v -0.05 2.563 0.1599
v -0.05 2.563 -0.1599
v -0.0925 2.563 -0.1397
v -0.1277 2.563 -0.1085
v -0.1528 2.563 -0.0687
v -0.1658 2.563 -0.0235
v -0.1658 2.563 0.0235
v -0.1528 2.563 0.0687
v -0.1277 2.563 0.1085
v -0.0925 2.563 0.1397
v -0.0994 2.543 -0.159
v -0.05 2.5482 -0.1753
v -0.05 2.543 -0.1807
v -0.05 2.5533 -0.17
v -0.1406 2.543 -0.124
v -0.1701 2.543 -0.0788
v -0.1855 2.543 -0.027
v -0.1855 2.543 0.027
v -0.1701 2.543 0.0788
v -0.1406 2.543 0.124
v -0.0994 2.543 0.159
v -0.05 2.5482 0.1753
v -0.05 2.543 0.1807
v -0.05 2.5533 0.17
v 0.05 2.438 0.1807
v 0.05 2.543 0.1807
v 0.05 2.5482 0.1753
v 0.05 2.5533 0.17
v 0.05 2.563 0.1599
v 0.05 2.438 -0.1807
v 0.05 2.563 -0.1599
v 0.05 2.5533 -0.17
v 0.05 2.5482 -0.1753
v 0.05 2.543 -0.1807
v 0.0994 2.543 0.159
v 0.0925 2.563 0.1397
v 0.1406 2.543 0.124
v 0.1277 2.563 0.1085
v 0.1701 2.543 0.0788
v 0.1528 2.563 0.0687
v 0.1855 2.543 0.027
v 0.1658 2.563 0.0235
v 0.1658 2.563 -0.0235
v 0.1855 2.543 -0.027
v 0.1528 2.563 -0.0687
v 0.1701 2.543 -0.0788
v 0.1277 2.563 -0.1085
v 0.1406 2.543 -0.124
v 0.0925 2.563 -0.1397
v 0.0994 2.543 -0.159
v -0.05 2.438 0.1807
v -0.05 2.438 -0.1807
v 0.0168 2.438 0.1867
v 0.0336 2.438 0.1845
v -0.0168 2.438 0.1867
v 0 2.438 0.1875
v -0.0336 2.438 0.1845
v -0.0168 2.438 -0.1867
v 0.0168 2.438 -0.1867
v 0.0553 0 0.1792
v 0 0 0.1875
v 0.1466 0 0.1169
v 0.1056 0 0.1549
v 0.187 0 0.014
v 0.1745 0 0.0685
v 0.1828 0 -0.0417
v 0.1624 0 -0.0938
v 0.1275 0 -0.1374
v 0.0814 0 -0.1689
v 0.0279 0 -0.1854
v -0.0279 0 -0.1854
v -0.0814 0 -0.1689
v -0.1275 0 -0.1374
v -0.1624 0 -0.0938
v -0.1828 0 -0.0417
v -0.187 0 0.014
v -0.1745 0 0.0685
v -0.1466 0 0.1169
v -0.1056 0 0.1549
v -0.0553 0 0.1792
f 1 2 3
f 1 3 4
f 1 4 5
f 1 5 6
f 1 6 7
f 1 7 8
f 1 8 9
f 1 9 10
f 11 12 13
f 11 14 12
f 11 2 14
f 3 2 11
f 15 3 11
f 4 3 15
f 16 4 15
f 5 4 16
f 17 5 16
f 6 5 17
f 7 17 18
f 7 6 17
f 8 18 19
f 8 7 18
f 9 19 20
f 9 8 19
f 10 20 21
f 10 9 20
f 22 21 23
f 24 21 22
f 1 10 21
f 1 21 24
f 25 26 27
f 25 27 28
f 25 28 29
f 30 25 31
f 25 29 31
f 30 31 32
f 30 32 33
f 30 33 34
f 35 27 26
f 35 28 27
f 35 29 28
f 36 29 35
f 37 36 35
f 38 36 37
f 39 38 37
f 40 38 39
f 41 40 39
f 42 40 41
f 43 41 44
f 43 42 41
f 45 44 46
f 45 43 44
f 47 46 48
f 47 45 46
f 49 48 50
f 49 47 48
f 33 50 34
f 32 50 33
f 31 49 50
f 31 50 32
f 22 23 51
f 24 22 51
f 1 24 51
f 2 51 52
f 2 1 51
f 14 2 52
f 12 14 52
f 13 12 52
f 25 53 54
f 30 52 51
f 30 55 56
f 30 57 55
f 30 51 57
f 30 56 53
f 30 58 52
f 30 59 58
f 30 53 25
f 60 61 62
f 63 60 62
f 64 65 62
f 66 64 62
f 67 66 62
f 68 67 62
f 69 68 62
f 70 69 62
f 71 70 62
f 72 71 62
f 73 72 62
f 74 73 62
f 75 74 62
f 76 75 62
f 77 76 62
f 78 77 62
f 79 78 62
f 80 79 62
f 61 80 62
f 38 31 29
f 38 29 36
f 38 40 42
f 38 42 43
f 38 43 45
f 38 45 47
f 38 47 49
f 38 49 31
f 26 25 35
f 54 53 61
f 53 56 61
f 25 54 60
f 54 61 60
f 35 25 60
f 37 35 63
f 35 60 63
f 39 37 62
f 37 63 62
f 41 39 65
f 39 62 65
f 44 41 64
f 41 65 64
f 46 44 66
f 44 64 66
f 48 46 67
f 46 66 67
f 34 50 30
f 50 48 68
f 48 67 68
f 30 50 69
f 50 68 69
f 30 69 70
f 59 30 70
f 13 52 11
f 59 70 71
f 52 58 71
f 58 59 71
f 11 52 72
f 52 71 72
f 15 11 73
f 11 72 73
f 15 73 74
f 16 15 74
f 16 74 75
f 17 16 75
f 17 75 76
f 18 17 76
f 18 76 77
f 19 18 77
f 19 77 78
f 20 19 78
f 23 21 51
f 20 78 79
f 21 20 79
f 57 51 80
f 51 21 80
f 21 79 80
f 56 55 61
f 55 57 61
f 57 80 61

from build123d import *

# Parameters (mm, degrees)
SKETCH1_R           = 0.1875
BOSS_EXTRUDE1_DEPTH = 2.563
SKETCH2_W           = 0.1
SKETCH2_H           = 0.493436948
CUT_EXTRUDE1_DEPTH  = 0.125
CHAMFER1_SIZE       = 0.02


with BuildPart() as part:
    # Sketch1 → Boss-Extrude1 (new body)
    with BuildSketch(Plane(origin=(0, 0, 0), x_dir=(1, 0, 0), z_dir=(0, 1, 0))):
        with Locations(Location((0, 0, 0), (0, 0, 270))):
            Circle(SKETCH1_R)
    extrude(amount=BOSS_EXTRUDE1_DEPTH)

    # Sketch2 → Cut-Extrude1 (cut)
    with BuildSketch(Plane(origin=(0, 2.563, 0), x_dir=(1, 0, 0), z_dir=(0, 1, 0))):
        Rectangle(SKETCH2_W, SKETCH2_H)
    extrude(amount=-CUT_EXTRUDE1_DEPTH, mode=Mode.SUBTRACT)

    # Chamfer1
    chamfer1_edges = [part.edges().sort_by_distance(p)[0] for p in [
        (0.1875, 2.563, 0),
        (-0.1875, 2.563, 0),
    ]]
    chamfer(chamfer1_edges, length=CHAMFER1_SIZE)


solid = part.part
